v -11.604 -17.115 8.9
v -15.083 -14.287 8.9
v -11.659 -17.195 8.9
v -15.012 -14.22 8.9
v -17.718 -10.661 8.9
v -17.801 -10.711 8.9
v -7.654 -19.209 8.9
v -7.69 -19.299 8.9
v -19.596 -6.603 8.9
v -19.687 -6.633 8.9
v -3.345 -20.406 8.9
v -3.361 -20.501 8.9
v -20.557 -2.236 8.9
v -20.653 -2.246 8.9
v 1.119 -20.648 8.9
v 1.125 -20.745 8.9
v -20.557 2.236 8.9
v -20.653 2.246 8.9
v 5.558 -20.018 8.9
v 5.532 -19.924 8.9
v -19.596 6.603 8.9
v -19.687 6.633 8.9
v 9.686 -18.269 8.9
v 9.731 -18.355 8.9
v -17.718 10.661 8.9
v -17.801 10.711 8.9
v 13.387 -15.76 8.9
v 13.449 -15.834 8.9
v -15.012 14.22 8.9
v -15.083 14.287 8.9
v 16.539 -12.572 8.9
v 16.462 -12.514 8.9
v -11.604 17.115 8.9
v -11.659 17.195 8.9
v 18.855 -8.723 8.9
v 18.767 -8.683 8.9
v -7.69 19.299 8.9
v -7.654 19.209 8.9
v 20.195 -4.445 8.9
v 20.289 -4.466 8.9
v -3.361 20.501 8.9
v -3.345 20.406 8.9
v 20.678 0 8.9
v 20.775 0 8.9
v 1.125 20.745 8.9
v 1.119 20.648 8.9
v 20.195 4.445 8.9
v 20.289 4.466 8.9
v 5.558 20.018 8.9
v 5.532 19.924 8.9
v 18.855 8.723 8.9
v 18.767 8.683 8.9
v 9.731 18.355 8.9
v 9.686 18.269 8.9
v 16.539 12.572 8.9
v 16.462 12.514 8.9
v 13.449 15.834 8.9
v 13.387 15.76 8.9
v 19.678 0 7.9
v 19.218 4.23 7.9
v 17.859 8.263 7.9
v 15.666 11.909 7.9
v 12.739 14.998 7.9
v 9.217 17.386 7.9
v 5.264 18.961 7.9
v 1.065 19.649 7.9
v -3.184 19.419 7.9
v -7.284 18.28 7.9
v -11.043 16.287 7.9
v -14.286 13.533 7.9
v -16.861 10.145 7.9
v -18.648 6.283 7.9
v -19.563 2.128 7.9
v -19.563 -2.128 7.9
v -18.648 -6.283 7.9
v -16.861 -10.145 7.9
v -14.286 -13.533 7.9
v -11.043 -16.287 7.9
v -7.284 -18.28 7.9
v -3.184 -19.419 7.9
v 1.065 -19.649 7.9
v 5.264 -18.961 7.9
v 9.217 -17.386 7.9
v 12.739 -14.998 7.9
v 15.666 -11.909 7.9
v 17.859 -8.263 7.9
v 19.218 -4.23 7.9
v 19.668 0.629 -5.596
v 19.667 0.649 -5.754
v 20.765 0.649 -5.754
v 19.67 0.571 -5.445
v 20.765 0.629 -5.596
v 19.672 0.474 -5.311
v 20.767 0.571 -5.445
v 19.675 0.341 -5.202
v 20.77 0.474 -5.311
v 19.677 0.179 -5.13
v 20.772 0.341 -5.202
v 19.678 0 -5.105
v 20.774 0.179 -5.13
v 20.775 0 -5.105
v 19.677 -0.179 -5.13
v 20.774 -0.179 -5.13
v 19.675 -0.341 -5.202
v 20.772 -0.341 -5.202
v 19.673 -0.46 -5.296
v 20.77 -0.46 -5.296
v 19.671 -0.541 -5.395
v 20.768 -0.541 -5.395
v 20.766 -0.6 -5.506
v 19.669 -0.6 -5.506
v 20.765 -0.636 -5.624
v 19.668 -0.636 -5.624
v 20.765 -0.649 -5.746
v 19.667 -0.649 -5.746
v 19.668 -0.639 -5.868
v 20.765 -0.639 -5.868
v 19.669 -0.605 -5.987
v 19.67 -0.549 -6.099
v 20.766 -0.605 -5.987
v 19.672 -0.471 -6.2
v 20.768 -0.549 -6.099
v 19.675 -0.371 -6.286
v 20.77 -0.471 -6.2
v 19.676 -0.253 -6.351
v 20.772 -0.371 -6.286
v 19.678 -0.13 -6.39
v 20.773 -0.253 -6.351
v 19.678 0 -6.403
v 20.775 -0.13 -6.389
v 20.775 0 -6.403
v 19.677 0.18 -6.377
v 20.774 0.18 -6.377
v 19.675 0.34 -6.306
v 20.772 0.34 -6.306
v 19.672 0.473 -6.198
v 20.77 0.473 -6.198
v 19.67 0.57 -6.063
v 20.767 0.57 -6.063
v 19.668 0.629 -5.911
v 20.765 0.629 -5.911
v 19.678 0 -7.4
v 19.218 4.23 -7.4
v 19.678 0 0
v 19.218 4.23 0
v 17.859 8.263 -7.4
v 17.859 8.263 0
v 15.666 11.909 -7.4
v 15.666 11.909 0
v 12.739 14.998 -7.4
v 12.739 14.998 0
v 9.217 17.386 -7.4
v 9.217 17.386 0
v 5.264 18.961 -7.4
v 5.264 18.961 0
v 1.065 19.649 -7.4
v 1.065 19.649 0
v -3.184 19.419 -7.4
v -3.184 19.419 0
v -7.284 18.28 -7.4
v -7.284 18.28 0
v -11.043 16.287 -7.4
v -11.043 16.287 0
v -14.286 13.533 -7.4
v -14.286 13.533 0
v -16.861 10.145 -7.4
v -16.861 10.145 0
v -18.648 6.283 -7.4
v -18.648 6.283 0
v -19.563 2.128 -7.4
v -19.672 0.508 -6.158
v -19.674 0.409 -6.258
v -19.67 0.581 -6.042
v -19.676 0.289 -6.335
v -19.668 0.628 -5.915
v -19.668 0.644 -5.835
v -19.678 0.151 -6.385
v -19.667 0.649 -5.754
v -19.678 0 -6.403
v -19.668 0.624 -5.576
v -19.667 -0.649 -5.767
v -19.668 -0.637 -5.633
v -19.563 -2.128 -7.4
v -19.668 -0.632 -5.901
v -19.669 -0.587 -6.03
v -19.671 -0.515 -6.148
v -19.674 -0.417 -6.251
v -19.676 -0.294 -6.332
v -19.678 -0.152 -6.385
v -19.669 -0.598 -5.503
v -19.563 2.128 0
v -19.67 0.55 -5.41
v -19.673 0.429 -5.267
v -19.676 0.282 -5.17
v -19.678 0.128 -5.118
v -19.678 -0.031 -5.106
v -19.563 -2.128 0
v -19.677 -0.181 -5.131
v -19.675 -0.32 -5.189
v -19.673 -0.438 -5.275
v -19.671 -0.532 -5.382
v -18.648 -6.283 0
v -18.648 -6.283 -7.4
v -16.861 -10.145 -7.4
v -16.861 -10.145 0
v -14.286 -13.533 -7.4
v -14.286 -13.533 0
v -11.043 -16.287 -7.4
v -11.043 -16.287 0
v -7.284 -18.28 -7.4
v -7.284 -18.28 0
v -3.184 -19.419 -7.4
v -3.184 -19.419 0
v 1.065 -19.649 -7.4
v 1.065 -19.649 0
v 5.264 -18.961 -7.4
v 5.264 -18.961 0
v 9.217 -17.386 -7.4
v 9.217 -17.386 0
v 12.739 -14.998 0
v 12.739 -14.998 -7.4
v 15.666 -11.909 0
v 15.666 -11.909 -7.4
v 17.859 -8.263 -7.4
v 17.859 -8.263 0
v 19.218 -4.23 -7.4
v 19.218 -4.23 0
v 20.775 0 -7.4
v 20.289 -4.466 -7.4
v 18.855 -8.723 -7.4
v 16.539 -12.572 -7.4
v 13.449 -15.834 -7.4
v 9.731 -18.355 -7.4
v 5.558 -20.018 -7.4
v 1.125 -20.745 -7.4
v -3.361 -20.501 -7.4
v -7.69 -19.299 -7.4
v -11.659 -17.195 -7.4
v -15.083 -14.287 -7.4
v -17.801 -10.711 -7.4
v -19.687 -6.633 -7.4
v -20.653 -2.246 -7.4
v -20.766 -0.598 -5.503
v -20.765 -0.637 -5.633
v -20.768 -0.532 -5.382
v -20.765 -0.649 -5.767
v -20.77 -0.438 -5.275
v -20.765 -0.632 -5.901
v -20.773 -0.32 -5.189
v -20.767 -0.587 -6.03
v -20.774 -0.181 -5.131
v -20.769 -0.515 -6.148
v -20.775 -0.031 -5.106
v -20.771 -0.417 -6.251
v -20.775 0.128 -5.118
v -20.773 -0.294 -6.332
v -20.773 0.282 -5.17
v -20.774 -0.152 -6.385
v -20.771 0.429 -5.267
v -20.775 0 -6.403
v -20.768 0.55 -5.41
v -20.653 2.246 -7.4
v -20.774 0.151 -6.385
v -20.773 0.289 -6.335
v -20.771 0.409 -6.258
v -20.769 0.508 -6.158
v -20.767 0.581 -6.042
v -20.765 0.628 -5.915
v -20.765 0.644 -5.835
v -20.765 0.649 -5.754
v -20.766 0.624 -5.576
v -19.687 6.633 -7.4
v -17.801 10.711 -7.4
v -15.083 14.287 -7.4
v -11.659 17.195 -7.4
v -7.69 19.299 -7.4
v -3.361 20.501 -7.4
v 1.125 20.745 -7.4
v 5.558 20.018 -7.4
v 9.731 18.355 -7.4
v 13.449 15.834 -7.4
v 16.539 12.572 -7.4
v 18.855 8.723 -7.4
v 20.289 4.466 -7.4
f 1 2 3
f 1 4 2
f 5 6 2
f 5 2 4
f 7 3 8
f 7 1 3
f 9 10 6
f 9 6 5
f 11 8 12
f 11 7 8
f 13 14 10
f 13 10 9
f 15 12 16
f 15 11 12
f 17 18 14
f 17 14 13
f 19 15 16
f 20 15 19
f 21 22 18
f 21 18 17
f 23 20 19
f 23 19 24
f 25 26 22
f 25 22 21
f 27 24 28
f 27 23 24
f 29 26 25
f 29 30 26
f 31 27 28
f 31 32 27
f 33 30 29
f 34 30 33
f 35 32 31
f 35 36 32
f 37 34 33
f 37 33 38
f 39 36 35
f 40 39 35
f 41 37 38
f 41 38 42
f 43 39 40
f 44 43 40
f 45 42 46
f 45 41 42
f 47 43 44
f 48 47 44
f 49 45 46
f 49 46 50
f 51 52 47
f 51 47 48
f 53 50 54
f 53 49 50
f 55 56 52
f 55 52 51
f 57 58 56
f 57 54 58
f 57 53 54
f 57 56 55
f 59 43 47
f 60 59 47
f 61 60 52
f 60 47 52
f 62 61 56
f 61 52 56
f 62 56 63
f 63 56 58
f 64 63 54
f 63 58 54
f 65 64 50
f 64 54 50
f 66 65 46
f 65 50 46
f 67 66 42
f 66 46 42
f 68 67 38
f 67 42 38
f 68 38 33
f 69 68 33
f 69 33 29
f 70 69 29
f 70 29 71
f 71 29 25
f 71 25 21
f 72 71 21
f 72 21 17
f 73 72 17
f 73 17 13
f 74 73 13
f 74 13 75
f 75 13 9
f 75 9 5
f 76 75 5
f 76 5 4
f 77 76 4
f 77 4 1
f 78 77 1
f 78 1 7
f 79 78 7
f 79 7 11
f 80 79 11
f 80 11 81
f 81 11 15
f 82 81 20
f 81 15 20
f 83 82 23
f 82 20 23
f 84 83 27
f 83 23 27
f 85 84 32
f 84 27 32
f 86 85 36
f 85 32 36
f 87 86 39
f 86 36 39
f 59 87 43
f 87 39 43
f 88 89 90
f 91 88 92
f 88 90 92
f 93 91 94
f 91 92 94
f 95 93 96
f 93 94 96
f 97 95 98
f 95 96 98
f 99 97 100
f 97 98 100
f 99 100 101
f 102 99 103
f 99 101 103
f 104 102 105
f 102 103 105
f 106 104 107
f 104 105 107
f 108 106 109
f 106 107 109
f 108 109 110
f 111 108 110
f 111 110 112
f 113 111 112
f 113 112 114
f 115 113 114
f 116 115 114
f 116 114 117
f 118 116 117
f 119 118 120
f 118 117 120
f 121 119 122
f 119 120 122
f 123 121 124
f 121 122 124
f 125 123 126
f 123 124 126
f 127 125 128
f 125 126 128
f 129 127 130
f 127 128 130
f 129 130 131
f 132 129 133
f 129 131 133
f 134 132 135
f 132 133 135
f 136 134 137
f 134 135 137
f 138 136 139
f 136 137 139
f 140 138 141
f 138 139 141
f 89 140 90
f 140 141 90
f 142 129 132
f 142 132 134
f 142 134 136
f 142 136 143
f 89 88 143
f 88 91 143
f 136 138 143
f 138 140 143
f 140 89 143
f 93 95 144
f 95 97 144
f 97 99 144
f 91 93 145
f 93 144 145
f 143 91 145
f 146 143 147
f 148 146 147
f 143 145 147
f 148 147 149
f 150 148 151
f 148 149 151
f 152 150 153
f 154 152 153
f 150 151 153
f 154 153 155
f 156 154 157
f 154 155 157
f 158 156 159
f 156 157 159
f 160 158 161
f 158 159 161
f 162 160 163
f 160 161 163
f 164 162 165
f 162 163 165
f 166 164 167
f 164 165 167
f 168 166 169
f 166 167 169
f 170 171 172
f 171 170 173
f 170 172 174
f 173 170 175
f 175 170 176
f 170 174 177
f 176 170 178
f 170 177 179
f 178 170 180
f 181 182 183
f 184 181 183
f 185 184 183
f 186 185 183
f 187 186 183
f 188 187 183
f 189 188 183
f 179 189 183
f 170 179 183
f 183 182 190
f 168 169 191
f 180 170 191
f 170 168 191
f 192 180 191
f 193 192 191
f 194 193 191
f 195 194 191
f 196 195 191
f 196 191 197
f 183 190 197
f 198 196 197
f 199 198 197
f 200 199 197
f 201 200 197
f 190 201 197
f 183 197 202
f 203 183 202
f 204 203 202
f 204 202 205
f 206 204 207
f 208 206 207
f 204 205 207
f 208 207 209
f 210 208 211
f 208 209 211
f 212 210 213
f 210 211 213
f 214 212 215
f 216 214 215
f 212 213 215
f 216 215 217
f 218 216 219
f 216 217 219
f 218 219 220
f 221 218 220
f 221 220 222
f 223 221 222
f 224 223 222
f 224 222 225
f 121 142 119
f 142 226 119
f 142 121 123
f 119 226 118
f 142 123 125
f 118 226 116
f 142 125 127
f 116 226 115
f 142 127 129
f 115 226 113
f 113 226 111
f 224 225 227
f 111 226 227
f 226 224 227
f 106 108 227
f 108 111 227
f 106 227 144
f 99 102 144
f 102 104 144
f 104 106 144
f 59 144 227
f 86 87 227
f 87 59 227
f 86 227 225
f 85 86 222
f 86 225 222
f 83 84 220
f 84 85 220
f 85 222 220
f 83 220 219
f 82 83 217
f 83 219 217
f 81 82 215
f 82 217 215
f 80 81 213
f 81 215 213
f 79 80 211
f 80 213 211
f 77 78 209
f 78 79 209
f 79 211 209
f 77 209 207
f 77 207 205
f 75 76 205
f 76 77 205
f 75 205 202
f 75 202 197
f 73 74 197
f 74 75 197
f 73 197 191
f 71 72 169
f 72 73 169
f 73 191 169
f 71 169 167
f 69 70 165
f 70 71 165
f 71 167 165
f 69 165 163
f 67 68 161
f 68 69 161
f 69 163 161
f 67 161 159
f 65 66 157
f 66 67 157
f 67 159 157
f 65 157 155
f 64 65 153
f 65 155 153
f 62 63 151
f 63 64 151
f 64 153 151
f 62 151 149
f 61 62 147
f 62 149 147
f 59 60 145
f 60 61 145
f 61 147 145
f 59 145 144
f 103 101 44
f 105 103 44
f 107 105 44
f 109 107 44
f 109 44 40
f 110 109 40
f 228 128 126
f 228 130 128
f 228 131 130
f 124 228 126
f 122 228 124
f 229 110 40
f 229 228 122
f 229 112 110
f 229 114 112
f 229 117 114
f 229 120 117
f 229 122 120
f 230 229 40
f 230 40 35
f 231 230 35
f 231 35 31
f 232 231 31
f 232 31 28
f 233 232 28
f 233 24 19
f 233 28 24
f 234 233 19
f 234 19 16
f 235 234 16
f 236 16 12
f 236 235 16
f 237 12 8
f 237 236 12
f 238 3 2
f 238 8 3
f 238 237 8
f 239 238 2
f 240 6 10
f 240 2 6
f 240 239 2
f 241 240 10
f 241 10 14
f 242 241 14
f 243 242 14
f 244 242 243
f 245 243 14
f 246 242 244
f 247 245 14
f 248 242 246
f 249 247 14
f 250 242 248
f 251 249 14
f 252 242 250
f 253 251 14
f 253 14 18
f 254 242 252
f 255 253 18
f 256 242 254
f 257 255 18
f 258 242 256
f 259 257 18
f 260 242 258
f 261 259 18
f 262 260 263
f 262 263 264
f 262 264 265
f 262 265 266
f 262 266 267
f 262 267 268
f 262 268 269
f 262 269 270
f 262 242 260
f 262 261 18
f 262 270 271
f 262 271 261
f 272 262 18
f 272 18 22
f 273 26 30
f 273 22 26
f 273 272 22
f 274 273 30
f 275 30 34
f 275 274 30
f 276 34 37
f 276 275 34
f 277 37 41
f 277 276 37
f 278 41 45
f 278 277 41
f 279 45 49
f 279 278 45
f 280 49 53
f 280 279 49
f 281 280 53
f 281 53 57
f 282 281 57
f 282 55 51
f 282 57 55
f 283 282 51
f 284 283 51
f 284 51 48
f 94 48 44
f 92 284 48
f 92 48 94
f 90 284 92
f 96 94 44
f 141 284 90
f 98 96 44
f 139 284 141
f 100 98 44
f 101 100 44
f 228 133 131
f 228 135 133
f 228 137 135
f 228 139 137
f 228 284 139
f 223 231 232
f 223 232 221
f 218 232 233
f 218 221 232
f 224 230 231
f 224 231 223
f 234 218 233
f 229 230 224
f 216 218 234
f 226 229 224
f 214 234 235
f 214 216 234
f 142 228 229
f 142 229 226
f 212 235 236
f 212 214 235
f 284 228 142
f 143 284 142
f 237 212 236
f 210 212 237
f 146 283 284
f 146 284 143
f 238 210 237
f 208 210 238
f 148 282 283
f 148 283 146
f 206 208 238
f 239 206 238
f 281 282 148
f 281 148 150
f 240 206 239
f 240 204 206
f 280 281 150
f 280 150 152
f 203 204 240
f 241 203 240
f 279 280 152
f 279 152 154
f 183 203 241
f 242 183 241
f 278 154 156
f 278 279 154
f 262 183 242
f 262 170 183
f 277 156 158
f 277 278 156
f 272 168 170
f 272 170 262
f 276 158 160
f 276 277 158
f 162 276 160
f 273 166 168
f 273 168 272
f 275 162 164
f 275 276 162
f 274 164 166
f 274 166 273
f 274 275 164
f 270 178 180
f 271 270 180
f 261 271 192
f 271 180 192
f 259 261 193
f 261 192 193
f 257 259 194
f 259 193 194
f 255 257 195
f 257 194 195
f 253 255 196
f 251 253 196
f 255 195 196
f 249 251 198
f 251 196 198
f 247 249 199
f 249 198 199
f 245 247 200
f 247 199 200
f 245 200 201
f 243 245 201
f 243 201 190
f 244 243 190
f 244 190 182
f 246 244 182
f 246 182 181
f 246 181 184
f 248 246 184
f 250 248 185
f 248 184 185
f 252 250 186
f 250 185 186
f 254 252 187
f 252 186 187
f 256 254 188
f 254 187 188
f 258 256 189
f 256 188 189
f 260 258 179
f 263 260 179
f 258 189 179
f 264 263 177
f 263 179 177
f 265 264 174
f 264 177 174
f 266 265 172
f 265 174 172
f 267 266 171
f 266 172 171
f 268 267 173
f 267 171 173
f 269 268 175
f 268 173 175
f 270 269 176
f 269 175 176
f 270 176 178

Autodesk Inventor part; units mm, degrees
ref_plane "YZ Plane" through (0, 0, 0) normal (1, 0, 0) x (0, 1, 0)
ref_plane "XZ Plane" through (0, 0, 0) normal (0, 1, 0) x (-1, 0, 0)
ref_plane "XY Plane" through (0, 0, 0) normal (0, 0, 1) x (1, 0, 0)
sketch "Sketch1" plane through (0, 0, 0) normal (0, 0, 1) x (1, 0, 0)
  circle A0 centre (0, 0) radius 20.775
  circle A1 centre (0, 0) radius 19.6781
  dimension "d9" = 1.0969
  dimension "d10" = 41.55
extrude "Extrusion1" add sketch "Sketch1" along normal mid plane 17.8
chamfer "Chamfer1" distance 1 angle 45 1 edges at (-19.6781, 0, 8.9)
sketch "Sketch2" plane through (0, 0, -8.9) normal (0, 0, -1) x (-1, 0, 0)
  circle A0 centre (0, 0) radius 21.8479
extrude "Extrusion2" cut sketch "Sketch2" against normal blind 1.5
sketch "Sketch3" plane through (0, 0, 0) normal (1, 0, 0) x (0, 1, 0)
  circle A0 centre (0, -5.7538) radius 0.6488
  point P0 (0, 0)
extrude "Extrusion3" cut sketch "Sketch3" against normal mid plane 100
properties part number "_3DPrint"
